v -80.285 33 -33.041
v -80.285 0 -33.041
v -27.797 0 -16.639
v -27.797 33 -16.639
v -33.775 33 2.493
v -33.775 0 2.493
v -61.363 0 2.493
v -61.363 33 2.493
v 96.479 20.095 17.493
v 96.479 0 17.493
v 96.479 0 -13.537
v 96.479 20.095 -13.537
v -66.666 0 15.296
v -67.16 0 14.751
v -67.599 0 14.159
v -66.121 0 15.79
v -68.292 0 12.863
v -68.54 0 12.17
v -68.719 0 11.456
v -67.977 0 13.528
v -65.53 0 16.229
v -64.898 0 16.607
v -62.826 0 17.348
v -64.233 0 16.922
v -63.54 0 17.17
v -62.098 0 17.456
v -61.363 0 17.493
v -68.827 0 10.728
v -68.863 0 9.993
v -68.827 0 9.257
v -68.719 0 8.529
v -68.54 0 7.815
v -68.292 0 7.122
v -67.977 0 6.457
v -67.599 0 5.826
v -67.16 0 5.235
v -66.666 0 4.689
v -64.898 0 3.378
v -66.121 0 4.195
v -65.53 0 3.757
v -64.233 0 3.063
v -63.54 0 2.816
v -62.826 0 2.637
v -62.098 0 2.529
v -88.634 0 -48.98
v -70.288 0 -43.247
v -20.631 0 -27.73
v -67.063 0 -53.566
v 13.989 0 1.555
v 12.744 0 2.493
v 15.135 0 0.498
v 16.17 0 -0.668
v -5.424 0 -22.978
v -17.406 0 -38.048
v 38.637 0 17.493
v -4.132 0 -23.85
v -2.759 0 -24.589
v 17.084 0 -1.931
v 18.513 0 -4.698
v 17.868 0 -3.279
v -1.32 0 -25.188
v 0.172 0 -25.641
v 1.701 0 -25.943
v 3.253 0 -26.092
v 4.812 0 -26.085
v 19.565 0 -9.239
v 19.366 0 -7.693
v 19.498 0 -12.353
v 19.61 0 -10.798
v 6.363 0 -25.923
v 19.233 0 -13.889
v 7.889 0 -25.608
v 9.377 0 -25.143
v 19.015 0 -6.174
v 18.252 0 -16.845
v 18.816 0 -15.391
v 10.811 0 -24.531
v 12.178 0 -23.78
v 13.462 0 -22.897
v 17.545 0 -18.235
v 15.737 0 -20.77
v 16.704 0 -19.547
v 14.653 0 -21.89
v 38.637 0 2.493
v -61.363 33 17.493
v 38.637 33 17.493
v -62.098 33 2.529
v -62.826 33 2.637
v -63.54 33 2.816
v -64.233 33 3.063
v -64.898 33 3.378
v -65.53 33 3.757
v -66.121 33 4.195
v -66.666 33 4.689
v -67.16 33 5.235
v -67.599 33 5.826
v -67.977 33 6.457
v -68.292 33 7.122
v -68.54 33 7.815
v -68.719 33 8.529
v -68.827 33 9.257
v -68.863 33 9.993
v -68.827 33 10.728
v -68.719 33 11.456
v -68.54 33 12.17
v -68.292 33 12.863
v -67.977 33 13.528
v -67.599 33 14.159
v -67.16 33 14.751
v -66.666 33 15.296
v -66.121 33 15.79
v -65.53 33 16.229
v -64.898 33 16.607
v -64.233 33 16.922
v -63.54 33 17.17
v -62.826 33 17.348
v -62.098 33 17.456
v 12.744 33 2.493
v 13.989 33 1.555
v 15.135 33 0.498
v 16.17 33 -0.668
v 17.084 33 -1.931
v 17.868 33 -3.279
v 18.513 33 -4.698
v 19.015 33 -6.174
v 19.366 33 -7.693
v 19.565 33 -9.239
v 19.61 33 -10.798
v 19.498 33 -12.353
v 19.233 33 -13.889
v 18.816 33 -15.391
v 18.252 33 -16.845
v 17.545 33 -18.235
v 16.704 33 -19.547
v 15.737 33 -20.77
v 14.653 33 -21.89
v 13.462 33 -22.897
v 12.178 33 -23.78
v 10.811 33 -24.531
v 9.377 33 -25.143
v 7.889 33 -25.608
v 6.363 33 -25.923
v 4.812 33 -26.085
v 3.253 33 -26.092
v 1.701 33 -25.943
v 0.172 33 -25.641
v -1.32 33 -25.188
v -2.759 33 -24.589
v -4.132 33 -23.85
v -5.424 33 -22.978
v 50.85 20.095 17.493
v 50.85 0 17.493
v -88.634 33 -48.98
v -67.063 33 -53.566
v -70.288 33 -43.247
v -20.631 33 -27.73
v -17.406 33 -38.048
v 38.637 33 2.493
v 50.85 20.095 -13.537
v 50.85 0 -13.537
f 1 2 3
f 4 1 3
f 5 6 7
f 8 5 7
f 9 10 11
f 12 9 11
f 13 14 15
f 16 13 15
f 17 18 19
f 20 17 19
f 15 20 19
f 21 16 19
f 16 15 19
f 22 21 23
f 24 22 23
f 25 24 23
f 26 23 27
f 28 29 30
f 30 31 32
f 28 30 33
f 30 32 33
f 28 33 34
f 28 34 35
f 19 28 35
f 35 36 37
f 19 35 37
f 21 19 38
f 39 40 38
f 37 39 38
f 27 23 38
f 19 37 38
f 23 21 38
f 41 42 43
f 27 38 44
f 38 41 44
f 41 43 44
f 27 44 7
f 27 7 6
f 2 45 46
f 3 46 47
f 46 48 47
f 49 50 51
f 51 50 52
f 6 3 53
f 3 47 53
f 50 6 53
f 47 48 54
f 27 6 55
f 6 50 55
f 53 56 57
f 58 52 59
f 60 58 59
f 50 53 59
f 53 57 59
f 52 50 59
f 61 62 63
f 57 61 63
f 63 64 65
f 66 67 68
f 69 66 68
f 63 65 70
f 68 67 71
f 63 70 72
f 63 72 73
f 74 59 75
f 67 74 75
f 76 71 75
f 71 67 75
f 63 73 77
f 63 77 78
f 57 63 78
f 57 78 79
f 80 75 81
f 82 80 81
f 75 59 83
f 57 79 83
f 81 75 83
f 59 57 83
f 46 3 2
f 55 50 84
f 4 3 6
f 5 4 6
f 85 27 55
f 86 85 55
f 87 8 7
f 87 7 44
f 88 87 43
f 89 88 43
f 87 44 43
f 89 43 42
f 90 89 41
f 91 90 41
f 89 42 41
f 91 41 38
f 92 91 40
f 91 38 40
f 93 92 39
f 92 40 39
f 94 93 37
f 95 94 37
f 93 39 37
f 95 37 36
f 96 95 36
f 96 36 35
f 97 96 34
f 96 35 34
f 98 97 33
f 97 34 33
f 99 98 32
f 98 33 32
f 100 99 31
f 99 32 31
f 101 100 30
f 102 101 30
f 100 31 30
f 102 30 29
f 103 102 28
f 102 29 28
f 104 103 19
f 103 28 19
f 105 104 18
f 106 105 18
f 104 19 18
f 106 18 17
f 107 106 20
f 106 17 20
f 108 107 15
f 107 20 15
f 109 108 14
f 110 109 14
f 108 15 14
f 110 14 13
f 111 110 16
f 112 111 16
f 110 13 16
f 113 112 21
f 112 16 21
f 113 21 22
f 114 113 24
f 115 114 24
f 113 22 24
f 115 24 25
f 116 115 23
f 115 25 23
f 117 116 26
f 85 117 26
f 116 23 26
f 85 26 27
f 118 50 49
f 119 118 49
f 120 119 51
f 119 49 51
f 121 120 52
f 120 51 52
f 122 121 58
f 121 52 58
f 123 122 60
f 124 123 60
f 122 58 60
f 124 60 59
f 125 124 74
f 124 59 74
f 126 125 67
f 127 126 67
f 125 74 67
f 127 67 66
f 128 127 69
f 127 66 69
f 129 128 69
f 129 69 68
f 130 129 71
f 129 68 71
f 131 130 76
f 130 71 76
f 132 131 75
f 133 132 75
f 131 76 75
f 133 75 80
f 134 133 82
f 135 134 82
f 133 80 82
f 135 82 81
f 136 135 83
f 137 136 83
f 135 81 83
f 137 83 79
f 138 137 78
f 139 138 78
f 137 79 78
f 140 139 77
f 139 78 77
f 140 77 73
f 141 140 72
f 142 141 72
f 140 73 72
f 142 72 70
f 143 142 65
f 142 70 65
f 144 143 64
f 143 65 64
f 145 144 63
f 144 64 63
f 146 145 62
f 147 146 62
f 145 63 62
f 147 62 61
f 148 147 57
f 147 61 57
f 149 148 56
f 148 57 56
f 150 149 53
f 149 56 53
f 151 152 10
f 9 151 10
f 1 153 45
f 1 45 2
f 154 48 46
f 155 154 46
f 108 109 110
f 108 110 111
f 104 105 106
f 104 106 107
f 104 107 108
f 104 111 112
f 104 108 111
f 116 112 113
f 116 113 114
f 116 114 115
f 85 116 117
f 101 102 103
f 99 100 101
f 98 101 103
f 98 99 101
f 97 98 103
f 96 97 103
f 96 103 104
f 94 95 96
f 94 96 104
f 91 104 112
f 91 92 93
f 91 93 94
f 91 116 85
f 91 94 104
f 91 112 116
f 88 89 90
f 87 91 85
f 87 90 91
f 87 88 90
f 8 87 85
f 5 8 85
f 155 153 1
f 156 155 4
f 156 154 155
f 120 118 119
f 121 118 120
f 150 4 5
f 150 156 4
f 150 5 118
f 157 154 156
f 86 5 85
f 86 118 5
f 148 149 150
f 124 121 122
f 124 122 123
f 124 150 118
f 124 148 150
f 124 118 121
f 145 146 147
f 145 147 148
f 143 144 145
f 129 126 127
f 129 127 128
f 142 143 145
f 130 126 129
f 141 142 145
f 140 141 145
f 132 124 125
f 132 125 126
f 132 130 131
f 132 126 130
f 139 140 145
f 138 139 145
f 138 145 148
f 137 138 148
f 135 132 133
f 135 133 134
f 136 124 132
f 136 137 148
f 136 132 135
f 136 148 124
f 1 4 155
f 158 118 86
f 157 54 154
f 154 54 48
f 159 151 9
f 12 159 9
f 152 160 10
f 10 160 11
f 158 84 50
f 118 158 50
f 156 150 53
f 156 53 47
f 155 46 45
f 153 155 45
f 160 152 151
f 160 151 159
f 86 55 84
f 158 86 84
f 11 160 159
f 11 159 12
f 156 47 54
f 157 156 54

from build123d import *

# Parameters (mm, degrees)
EXTRUDE_1_DEPTH     = 33
SKETCH_1_W          = 45.629751387
SKETCH_1_H          = 31.029699077
EXTRUDE_1_2_DEPTH   = 33
SKETCH_4_W          = 45.629751387
SKETCH_4_H          = 12.90510153
CUT_EXTRUDE_1_DEPTH = 33


with BuildPart() as part:
    # 草图1 → 凸台-拉伸1 (new body)
    with BuildSketch(Plane(origin=(0, 0, 0), x_dir=(1, 0, 0), z_dir=(0, 1, 0))):
        with BuildLine():
            Line((-88.633640643, 48.980495872), (-80.284516642, 33.041259142))
            Line((-80.284516642, 33.041259142), (-27.796591183, 16.638782436))
            Line((-27.796591183, 16.638782436), (-33.775142622, -2.492582169))
            Line((-33.775142622, -2.492582169), (-61.362867608, -2.492582169))
            ThreePointArc((-61.362867608, -2.492582169), (-68.862867608, -9.992582169), (-61.362867608, -17.492582169))
            Line((-61.362867608, -17.492582169), (38.637132392, -17.492582169))
            Line((38.637132392, -17.492582169), (38.637132392, -2.492582169))
            Line((38.637132392, -2.492582169), (12.743824311, -2.492582169))
            ThreePointArc((12.743824311, -2.492582169), (16.704464531, 19.547282527), (-5.424152751, 22.977530906))
            Line((-5.424152751, 22.977530906), (-20.630552368, 27.729530786))
            Line((-20.630552368, 27.729530786), (-17.406105012, 38.047762325))
            Line((-17.406105012, 38.047762325), (-67.063269568, 53.565626248))
            Line((-67.063269568, 53.565626248), (-70.287716924, 43.24739471))
            Line((-70.287716924, 43.24739471), (-88.633640643, 48.980495872))
        make_face()
    extrude(amount=EXTRUDE_1_DEPTH)


with BuildPart() as body_2:
    # 草图1 → Extrude 1 2 (new body)
    with BuildSketch(Plane(origin=(0, 0, 0), x_dir=(1, 0, 0), z_dir=(0, 1, 0))):
        with Locations((73.664502877, -1.977732631)):
            Rectangle(SKETCH_1_W, SKETCH_1_H)
    extrude(amount=EXTRUDE_1_2_DEPTH)

    # 草图4 → 切除-拉伸1 (cut)
    with BuildSketch(Plane.XY.offset(17.492582169)):
        with Locations((73.664502877, 26.547449235)):
            Rectangle(SKETCH_4_W, SKETCH_4_H)
    extrude(amount=-CUT_EXTRUDE_1_DEPTH, mode=Mode.SUBTRACT)


solid = Compound([part.part, body_2.part])
